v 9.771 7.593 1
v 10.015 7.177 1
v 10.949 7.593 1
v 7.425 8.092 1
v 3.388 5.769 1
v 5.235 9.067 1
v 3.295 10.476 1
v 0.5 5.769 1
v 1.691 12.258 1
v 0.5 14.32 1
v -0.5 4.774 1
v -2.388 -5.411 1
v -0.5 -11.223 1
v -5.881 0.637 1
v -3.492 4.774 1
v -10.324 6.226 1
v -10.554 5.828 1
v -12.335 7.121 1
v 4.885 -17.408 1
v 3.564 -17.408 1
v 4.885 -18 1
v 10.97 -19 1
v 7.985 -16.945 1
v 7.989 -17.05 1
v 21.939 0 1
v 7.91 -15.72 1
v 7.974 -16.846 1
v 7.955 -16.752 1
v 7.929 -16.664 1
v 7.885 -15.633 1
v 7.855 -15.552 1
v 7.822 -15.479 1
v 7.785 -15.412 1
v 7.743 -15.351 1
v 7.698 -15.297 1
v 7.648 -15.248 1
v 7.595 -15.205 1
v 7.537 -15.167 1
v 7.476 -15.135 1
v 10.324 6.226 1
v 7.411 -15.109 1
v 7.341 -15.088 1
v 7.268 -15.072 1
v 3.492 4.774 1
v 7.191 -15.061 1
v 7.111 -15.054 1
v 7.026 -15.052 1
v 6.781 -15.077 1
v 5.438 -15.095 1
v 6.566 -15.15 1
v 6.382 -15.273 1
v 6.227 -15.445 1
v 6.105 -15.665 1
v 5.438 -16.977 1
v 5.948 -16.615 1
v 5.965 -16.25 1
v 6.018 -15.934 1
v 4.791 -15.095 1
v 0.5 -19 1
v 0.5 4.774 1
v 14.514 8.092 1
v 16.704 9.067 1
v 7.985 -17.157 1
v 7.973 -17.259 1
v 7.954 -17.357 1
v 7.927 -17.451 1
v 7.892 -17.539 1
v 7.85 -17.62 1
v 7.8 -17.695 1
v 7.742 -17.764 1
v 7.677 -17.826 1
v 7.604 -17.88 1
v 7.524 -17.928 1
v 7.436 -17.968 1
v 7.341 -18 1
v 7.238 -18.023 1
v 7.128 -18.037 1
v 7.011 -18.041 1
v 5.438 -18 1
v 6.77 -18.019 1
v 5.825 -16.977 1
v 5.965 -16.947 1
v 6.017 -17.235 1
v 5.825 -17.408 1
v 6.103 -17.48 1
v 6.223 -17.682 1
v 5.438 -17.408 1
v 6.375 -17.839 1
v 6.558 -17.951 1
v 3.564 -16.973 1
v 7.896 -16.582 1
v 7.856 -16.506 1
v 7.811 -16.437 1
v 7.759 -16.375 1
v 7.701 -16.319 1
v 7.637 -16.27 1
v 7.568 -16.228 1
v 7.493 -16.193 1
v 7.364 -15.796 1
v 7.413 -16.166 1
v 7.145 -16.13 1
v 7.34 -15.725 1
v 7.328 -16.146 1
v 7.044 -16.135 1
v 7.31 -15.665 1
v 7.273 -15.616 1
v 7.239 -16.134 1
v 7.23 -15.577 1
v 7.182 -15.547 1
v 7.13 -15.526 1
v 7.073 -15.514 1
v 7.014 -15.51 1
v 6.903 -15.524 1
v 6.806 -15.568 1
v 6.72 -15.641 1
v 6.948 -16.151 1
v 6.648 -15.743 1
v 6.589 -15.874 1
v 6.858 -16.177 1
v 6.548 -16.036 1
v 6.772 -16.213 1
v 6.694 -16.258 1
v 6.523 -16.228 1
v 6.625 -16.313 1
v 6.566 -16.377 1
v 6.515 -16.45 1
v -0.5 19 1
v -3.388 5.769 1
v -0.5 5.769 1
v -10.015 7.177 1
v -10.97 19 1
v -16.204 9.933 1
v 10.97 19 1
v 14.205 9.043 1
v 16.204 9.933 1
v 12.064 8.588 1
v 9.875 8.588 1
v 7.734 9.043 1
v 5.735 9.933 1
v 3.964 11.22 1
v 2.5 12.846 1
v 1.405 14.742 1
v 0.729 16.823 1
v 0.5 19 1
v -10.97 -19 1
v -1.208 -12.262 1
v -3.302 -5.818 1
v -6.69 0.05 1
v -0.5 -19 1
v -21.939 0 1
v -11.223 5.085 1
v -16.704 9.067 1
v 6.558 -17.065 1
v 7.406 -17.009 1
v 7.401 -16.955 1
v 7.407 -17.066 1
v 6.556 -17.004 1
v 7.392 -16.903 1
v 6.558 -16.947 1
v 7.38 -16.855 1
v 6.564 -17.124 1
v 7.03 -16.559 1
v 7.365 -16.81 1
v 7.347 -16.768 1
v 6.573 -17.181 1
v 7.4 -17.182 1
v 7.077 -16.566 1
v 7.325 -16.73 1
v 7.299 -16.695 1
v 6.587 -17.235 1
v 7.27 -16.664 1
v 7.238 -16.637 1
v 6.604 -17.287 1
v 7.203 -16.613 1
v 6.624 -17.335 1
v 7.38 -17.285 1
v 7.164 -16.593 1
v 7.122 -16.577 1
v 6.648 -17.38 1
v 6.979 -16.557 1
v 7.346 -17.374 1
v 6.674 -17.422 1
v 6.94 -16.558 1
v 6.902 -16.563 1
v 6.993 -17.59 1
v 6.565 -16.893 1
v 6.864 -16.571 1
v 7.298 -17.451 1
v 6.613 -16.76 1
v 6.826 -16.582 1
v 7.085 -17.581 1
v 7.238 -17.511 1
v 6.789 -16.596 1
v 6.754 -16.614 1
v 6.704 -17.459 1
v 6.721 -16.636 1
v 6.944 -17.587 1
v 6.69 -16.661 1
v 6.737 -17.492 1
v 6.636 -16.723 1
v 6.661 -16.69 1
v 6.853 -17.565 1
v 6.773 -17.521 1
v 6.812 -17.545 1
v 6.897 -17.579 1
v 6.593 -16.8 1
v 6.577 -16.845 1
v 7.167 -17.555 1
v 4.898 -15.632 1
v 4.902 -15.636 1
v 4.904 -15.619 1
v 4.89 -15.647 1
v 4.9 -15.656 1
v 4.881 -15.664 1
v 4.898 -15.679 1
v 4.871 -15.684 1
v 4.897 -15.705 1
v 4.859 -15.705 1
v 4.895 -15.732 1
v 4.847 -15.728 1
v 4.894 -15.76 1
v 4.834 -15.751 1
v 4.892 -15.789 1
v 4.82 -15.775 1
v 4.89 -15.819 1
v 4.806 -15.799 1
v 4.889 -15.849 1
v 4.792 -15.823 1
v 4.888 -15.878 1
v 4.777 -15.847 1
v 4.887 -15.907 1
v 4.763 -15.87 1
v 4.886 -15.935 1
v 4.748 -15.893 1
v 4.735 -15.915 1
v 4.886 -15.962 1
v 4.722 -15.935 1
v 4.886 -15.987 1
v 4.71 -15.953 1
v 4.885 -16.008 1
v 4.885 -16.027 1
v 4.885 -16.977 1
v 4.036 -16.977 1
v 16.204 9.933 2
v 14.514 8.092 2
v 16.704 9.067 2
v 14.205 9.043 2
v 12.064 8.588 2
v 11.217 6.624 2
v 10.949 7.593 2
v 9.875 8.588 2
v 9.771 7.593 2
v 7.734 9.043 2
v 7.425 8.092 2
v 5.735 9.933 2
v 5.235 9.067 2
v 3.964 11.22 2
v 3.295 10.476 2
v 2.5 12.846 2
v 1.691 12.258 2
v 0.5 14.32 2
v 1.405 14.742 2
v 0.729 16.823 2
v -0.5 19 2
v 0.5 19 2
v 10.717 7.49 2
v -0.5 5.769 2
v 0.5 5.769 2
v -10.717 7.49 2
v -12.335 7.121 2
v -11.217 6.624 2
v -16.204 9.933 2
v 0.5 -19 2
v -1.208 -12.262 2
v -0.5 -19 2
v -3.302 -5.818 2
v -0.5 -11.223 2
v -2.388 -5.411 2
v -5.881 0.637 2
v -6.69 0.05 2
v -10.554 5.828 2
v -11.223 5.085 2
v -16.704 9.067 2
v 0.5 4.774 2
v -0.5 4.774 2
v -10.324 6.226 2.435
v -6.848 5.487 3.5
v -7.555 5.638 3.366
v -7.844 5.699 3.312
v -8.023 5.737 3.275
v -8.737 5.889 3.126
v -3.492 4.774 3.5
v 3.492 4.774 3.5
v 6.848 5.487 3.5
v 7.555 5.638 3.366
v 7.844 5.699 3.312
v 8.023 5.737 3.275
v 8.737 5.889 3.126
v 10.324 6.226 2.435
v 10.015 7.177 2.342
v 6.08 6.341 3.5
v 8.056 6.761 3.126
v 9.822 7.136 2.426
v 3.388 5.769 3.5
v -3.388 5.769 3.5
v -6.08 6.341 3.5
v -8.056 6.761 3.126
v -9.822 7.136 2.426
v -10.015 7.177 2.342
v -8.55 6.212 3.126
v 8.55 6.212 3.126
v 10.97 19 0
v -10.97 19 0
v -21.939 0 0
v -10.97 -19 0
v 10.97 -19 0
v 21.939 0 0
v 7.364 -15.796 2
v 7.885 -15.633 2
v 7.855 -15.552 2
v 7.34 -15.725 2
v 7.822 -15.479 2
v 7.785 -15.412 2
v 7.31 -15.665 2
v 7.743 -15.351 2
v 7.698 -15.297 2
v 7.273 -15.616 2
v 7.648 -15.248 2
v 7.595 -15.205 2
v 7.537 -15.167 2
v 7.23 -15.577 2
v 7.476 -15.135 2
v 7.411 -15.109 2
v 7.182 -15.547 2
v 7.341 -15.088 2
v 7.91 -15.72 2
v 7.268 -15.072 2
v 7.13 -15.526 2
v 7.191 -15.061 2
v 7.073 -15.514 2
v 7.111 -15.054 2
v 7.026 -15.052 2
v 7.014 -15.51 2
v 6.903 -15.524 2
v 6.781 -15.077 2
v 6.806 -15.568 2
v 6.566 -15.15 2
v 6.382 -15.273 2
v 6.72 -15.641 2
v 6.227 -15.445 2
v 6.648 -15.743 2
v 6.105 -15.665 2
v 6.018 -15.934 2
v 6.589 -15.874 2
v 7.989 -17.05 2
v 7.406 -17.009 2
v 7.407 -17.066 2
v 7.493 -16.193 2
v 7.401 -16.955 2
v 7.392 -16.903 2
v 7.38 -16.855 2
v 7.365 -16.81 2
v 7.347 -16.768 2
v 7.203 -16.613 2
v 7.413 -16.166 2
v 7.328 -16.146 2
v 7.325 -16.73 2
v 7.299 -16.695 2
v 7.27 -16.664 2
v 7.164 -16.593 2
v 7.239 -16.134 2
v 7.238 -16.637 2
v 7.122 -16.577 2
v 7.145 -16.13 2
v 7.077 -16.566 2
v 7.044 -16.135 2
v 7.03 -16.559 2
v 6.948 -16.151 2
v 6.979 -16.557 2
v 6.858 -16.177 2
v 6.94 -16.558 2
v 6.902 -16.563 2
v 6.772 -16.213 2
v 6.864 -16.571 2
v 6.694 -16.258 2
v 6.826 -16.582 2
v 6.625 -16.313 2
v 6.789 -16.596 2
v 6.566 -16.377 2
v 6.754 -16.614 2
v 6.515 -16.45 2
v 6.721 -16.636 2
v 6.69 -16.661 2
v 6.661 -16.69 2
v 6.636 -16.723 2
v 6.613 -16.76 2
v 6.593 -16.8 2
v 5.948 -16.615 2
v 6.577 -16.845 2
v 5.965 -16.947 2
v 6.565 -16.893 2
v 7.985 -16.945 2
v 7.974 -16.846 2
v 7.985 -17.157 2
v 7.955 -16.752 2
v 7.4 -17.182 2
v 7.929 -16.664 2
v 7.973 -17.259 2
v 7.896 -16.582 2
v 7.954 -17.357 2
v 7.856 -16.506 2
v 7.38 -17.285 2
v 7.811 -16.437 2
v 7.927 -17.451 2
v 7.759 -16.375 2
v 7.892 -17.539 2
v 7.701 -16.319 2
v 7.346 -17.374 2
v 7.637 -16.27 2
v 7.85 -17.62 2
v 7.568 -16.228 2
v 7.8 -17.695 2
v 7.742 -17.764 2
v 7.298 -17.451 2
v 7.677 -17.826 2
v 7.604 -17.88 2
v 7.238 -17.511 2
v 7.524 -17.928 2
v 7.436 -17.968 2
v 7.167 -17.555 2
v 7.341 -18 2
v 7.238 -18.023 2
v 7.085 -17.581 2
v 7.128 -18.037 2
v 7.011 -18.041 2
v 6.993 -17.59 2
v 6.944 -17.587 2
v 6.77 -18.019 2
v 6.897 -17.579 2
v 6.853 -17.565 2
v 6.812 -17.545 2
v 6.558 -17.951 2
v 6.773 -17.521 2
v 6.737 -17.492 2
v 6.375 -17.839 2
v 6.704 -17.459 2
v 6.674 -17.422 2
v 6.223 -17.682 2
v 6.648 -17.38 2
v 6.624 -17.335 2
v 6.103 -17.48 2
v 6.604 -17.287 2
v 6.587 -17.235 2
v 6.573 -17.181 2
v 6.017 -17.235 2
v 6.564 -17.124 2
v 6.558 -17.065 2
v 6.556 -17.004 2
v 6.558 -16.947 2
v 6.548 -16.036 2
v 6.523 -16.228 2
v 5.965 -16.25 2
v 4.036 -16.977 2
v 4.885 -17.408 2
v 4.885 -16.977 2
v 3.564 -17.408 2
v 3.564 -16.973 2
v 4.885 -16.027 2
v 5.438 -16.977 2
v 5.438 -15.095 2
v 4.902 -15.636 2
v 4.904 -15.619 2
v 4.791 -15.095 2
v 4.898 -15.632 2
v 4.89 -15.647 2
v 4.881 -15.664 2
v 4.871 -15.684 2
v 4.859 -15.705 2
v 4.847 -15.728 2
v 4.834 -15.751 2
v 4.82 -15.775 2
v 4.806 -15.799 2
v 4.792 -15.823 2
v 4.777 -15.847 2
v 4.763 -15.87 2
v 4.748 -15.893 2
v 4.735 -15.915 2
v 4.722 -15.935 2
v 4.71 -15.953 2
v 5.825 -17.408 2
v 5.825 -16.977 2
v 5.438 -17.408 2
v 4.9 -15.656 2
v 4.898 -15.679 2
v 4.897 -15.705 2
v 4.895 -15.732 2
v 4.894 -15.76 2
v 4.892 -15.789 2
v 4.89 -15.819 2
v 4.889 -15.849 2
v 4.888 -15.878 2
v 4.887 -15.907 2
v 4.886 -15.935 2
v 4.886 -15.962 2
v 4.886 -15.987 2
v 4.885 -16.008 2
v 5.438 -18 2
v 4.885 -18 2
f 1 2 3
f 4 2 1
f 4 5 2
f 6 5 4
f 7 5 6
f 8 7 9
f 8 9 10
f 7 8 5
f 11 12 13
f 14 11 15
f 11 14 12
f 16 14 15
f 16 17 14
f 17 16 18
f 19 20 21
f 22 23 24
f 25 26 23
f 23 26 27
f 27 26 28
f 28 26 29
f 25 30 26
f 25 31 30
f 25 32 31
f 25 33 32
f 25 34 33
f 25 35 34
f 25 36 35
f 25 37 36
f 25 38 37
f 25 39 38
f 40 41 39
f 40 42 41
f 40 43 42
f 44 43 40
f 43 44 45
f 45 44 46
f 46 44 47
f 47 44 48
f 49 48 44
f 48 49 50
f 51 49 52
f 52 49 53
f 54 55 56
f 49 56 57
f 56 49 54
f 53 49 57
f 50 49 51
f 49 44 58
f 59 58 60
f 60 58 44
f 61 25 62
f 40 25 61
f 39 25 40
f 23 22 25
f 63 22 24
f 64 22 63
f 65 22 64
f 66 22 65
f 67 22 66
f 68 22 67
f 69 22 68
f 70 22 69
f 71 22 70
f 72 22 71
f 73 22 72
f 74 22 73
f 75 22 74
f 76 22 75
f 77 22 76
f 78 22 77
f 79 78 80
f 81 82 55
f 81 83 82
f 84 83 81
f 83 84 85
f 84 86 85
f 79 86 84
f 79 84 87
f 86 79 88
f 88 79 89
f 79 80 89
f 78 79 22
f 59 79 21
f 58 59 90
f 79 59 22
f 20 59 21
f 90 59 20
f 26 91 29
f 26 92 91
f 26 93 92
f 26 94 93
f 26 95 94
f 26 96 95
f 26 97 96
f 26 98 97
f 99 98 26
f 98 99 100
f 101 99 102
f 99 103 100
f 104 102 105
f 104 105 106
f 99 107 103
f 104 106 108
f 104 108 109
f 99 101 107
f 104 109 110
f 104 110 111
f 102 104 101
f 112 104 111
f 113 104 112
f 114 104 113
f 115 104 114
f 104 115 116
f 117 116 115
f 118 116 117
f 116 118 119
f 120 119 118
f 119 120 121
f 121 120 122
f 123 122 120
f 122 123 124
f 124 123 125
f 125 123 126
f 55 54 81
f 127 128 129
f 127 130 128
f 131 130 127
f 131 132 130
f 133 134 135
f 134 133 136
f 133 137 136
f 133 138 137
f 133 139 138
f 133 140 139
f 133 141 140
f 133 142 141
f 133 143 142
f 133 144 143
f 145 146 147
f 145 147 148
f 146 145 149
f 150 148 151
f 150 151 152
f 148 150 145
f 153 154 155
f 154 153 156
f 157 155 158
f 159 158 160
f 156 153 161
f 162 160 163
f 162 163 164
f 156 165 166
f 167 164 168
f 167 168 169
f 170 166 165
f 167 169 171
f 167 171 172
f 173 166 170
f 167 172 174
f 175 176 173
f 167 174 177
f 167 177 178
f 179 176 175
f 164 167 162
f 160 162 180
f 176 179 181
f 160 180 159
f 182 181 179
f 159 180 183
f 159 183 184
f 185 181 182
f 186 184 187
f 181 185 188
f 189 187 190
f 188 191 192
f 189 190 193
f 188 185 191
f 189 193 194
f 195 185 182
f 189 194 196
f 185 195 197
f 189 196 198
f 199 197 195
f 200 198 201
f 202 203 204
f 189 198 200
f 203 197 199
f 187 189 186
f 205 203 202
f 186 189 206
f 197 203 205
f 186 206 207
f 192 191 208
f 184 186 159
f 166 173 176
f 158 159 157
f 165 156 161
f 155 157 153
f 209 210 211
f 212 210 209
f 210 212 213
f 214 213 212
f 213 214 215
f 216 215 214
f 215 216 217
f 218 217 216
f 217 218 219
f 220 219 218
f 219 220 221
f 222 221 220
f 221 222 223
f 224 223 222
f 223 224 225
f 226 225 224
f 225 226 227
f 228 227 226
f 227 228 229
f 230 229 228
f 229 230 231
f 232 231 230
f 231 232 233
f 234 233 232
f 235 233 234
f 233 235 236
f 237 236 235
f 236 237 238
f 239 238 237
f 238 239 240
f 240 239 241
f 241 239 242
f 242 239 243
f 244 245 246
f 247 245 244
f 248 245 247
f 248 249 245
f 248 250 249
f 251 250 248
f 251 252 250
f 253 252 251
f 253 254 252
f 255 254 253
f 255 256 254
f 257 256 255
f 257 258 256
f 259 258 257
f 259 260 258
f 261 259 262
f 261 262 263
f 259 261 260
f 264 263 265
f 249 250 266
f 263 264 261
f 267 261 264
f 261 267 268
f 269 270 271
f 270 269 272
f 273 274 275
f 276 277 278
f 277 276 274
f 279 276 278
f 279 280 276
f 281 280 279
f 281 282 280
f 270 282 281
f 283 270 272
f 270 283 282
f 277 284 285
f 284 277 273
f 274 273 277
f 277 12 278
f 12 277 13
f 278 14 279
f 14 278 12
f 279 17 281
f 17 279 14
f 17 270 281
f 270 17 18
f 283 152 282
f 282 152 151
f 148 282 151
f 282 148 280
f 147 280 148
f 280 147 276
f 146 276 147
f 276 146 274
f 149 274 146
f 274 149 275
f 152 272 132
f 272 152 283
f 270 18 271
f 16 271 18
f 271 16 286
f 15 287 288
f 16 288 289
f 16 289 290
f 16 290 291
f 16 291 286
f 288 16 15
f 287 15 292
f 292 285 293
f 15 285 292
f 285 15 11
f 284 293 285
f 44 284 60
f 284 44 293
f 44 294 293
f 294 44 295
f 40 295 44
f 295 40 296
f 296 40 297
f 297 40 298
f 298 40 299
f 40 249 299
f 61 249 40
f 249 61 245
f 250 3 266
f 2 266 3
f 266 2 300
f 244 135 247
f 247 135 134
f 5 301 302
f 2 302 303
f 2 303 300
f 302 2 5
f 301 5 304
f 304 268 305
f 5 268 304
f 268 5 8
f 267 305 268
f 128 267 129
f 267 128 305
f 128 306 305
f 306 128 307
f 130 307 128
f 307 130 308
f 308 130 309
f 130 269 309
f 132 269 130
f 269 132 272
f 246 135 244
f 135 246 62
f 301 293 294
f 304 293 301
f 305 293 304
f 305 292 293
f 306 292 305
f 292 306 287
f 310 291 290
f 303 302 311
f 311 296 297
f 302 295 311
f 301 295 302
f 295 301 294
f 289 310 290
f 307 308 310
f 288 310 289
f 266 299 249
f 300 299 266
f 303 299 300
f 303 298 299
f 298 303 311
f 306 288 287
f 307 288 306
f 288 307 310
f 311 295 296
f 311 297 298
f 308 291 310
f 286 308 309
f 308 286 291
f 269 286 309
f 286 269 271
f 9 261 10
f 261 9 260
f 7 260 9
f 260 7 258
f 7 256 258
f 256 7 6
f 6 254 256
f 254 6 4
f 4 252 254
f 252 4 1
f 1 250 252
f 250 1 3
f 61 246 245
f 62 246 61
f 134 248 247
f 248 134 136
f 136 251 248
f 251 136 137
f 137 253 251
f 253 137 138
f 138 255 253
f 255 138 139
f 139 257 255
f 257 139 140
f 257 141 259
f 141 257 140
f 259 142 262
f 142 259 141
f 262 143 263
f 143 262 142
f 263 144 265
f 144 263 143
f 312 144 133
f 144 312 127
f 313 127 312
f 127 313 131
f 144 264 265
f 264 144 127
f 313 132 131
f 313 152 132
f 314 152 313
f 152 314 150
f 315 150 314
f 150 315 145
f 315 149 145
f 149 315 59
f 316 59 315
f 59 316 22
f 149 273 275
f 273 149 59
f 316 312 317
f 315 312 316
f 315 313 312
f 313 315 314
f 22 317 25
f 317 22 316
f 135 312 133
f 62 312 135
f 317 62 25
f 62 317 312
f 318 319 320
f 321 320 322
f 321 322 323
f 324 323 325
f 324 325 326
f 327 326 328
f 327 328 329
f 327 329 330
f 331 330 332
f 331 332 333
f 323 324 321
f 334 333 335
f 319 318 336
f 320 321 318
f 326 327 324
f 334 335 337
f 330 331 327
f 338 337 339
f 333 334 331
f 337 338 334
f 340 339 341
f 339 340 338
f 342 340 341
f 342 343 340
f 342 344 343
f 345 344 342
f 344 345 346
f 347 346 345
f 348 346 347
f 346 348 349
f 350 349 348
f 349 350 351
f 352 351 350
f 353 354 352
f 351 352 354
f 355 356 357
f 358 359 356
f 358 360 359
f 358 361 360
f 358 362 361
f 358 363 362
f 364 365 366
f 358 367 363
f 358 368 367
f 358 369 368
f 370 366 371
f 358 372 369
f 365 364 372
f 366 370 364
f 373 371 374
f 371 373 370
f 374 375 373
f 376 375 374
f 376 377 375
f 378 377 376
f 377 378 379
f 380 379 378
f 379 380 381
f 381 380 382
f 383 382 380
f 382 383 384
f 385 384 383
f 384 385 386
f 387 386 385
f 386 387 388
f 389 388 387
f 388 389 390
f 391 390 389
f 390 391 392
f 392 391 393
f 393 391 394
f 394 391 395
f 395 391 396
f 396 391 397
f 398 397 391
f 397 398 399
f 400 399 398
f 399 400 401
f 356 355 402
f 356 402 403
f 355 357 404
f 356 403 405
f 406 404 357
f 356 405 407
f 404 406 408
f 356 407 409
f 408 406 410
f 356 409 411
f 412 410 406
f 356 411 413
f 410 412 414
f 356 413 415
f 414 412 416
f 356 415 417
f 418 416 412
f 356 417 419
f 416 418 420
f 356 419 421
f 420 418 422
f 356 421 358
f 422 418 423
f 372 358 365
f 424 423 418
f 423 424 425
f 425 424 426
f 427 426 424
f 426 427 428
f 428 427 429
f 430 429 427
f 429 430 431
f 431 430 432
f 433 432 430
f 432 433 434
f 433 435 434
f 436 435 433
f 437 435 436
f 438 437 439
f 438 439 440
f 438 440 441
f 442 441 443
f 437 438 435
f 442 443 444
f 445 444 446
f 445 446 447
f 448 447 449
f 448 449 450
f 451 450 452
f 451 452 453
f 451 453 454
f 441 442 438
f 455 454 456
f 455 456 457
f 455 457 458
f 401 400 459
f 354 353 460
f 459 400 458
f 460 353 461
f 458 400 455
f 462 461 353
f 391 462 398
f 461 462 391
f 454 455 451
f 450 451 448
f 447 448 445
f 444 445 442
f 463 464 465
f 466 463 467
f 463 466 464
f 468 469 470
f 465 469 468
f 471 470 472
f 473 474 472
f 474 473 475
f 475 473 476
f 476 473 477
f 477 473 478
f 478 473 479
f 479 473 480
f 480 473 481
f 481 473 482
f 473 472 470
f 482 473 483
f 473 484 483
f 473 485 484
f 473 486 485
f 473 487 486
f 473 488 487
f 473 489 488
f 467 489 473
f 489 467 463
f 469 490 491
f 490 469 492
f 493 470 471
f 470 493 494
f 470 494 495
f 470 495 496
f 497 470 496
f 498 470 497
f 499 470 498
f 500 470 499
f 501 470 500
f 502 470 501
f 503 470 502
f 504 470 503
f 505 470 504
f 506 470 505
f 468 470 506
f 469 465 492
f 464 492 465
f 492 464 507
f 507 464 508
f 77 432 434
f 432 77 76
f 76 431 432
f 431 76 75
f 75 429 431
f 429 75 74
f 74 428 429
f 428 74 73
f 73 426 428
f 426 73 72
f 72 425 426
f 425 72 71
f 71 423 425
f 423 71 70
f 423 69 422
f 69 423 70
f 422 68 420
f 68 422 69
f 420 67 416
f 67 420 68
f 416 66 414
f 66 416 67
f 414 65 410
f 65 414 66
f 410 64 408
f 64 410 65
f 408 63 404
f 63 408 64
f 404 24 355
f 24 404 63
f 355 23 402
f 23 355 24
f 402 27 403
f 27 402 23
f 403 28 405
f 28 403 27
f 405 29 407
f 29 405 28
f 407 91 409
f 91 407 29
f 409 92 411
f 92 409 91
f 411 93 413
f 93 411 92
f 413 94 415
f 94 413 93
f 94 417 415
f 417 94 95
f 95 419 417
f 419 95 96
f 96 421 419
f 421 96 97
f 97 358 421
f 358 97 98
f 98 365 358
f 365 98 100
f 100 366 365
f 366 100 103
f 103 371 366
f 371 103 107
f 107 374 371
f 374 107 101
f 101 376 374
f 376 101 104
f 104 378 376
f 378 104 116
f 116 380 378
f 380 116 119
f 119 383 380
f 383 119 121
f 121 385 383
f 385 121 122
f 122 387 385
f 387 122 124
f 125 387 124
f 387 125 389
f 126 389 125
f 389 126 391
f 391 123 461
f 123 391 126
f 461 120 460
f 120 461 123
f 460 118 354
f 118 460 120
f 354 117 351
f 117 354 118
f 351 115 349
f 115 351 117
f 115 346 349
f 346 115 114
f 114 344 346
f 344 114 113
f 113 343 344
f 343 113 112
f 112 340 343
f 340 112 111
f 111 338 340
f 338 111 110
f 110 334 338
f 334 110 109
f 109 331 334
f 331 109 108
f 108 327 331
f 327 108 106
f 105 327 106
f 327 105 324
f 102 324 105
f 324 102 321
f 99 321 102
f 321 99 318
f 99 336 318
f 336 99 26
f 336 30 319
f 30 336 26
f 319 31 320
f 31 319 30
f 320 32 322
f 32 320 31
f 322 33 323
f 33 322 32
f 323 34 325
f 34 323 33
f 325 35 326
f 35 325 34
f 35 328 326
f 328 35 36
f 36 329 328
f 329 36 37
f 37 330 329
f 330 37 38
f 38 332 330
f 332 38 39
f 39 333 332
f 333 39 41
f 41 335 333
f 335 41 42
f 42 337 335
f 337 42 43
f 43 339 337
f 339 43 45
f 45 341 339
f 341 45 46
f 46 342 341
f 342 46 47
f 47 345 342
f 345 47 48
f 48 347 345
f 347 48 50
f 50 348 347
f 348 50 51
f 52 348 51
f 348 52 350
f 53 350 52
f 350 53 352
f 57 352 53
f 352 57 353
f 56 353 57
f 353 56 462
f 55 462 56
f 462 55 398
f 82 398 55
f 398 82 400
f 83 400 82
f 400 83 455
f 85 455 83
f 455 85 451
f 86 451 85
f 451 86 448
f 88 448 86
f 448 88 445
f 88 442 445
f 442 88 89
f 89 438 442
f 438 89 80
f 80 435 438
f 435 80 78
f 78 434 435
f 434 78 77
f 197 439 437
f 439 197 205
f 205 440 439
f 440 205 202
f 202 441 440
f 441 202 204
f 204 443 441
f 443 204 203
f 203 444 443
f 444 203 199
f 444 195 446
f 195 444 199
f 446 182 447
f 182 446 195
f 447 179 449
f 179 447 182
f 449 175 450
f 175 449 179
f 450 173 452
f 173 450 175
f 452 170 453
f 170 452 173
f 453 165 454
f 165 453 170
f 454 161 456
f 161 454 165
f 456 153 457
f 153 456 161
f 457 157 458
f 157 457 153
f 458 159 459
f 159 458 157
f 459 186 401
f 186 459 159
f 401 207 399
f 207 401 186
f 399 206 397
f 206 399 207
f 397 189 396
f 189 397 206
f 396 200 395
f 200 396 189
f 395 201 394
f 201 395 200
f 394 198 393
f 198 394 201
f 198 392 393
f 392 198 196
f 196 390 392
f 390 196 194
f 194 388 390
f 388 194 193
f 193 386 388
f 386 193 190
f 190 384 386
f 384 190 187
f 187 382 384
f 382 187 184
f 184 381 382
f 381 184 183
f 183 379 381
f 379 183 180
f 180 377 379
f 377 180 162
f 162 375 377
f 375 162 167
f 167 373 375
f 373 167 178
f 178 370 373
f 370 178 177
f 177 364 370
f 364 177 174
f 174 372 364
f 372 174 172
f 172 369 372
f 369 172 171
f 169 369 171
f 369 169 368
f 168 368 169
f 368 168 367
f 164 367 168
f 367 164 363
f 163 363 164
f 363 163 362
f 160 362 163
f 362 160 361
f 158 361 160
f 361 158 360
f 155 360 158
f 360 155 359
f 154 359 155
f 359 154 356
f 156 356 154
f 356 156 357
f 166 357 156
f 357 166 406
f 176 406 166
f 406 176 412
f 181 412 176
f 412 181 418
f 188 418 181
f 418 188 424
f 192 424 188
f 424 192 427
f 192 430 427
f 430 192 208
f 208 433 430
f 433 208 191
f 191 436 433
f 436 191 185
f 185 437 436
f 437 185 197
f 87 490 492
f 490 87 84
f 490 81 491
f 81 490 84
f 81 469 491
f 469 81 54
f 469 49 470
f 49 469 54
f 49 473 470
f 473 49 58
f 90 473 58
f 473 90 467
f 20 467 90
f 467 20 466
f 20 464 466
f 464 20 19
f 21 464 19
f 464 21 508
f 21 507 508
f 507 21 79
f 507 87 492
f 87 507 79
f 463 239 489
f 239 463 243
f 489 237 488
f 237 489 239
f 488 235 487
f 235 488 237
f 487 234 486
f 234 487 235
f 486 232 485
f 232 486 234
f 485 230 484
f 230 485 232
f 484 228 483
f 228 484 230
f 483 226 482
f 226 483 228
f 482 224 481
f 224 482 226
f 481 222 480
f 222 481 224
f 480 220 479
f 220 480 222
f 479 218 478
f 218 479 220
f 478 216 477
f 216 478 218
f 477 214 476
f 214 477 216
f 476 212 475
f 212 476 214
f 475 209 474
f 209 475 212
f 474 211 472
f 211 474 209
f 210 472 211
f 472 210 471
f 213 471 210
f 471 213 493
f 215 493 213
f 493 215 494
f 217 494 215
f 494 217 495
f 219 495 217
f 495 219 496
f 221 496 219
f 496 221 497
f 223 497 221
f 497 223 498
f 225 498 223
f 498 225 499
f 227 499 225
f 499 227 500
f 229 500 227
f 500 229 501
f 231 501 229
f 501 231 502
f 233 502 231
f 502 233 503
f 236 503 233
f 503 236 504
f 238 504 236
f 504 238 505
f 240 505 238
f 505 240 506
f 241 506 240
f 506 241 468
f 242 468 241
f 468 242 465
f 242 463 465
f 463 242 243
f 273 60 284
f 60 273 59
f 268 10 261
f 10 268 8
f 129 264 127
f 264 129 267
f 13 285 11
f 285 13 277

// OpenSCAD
include <../Scripts/18xx tiles basic functions.scad>
hex("Brown");
put_tilenr("46");
light_curve(r=4);
straight_line();
light_curve_bridge(r=2);
sharp_curve(r=2);
